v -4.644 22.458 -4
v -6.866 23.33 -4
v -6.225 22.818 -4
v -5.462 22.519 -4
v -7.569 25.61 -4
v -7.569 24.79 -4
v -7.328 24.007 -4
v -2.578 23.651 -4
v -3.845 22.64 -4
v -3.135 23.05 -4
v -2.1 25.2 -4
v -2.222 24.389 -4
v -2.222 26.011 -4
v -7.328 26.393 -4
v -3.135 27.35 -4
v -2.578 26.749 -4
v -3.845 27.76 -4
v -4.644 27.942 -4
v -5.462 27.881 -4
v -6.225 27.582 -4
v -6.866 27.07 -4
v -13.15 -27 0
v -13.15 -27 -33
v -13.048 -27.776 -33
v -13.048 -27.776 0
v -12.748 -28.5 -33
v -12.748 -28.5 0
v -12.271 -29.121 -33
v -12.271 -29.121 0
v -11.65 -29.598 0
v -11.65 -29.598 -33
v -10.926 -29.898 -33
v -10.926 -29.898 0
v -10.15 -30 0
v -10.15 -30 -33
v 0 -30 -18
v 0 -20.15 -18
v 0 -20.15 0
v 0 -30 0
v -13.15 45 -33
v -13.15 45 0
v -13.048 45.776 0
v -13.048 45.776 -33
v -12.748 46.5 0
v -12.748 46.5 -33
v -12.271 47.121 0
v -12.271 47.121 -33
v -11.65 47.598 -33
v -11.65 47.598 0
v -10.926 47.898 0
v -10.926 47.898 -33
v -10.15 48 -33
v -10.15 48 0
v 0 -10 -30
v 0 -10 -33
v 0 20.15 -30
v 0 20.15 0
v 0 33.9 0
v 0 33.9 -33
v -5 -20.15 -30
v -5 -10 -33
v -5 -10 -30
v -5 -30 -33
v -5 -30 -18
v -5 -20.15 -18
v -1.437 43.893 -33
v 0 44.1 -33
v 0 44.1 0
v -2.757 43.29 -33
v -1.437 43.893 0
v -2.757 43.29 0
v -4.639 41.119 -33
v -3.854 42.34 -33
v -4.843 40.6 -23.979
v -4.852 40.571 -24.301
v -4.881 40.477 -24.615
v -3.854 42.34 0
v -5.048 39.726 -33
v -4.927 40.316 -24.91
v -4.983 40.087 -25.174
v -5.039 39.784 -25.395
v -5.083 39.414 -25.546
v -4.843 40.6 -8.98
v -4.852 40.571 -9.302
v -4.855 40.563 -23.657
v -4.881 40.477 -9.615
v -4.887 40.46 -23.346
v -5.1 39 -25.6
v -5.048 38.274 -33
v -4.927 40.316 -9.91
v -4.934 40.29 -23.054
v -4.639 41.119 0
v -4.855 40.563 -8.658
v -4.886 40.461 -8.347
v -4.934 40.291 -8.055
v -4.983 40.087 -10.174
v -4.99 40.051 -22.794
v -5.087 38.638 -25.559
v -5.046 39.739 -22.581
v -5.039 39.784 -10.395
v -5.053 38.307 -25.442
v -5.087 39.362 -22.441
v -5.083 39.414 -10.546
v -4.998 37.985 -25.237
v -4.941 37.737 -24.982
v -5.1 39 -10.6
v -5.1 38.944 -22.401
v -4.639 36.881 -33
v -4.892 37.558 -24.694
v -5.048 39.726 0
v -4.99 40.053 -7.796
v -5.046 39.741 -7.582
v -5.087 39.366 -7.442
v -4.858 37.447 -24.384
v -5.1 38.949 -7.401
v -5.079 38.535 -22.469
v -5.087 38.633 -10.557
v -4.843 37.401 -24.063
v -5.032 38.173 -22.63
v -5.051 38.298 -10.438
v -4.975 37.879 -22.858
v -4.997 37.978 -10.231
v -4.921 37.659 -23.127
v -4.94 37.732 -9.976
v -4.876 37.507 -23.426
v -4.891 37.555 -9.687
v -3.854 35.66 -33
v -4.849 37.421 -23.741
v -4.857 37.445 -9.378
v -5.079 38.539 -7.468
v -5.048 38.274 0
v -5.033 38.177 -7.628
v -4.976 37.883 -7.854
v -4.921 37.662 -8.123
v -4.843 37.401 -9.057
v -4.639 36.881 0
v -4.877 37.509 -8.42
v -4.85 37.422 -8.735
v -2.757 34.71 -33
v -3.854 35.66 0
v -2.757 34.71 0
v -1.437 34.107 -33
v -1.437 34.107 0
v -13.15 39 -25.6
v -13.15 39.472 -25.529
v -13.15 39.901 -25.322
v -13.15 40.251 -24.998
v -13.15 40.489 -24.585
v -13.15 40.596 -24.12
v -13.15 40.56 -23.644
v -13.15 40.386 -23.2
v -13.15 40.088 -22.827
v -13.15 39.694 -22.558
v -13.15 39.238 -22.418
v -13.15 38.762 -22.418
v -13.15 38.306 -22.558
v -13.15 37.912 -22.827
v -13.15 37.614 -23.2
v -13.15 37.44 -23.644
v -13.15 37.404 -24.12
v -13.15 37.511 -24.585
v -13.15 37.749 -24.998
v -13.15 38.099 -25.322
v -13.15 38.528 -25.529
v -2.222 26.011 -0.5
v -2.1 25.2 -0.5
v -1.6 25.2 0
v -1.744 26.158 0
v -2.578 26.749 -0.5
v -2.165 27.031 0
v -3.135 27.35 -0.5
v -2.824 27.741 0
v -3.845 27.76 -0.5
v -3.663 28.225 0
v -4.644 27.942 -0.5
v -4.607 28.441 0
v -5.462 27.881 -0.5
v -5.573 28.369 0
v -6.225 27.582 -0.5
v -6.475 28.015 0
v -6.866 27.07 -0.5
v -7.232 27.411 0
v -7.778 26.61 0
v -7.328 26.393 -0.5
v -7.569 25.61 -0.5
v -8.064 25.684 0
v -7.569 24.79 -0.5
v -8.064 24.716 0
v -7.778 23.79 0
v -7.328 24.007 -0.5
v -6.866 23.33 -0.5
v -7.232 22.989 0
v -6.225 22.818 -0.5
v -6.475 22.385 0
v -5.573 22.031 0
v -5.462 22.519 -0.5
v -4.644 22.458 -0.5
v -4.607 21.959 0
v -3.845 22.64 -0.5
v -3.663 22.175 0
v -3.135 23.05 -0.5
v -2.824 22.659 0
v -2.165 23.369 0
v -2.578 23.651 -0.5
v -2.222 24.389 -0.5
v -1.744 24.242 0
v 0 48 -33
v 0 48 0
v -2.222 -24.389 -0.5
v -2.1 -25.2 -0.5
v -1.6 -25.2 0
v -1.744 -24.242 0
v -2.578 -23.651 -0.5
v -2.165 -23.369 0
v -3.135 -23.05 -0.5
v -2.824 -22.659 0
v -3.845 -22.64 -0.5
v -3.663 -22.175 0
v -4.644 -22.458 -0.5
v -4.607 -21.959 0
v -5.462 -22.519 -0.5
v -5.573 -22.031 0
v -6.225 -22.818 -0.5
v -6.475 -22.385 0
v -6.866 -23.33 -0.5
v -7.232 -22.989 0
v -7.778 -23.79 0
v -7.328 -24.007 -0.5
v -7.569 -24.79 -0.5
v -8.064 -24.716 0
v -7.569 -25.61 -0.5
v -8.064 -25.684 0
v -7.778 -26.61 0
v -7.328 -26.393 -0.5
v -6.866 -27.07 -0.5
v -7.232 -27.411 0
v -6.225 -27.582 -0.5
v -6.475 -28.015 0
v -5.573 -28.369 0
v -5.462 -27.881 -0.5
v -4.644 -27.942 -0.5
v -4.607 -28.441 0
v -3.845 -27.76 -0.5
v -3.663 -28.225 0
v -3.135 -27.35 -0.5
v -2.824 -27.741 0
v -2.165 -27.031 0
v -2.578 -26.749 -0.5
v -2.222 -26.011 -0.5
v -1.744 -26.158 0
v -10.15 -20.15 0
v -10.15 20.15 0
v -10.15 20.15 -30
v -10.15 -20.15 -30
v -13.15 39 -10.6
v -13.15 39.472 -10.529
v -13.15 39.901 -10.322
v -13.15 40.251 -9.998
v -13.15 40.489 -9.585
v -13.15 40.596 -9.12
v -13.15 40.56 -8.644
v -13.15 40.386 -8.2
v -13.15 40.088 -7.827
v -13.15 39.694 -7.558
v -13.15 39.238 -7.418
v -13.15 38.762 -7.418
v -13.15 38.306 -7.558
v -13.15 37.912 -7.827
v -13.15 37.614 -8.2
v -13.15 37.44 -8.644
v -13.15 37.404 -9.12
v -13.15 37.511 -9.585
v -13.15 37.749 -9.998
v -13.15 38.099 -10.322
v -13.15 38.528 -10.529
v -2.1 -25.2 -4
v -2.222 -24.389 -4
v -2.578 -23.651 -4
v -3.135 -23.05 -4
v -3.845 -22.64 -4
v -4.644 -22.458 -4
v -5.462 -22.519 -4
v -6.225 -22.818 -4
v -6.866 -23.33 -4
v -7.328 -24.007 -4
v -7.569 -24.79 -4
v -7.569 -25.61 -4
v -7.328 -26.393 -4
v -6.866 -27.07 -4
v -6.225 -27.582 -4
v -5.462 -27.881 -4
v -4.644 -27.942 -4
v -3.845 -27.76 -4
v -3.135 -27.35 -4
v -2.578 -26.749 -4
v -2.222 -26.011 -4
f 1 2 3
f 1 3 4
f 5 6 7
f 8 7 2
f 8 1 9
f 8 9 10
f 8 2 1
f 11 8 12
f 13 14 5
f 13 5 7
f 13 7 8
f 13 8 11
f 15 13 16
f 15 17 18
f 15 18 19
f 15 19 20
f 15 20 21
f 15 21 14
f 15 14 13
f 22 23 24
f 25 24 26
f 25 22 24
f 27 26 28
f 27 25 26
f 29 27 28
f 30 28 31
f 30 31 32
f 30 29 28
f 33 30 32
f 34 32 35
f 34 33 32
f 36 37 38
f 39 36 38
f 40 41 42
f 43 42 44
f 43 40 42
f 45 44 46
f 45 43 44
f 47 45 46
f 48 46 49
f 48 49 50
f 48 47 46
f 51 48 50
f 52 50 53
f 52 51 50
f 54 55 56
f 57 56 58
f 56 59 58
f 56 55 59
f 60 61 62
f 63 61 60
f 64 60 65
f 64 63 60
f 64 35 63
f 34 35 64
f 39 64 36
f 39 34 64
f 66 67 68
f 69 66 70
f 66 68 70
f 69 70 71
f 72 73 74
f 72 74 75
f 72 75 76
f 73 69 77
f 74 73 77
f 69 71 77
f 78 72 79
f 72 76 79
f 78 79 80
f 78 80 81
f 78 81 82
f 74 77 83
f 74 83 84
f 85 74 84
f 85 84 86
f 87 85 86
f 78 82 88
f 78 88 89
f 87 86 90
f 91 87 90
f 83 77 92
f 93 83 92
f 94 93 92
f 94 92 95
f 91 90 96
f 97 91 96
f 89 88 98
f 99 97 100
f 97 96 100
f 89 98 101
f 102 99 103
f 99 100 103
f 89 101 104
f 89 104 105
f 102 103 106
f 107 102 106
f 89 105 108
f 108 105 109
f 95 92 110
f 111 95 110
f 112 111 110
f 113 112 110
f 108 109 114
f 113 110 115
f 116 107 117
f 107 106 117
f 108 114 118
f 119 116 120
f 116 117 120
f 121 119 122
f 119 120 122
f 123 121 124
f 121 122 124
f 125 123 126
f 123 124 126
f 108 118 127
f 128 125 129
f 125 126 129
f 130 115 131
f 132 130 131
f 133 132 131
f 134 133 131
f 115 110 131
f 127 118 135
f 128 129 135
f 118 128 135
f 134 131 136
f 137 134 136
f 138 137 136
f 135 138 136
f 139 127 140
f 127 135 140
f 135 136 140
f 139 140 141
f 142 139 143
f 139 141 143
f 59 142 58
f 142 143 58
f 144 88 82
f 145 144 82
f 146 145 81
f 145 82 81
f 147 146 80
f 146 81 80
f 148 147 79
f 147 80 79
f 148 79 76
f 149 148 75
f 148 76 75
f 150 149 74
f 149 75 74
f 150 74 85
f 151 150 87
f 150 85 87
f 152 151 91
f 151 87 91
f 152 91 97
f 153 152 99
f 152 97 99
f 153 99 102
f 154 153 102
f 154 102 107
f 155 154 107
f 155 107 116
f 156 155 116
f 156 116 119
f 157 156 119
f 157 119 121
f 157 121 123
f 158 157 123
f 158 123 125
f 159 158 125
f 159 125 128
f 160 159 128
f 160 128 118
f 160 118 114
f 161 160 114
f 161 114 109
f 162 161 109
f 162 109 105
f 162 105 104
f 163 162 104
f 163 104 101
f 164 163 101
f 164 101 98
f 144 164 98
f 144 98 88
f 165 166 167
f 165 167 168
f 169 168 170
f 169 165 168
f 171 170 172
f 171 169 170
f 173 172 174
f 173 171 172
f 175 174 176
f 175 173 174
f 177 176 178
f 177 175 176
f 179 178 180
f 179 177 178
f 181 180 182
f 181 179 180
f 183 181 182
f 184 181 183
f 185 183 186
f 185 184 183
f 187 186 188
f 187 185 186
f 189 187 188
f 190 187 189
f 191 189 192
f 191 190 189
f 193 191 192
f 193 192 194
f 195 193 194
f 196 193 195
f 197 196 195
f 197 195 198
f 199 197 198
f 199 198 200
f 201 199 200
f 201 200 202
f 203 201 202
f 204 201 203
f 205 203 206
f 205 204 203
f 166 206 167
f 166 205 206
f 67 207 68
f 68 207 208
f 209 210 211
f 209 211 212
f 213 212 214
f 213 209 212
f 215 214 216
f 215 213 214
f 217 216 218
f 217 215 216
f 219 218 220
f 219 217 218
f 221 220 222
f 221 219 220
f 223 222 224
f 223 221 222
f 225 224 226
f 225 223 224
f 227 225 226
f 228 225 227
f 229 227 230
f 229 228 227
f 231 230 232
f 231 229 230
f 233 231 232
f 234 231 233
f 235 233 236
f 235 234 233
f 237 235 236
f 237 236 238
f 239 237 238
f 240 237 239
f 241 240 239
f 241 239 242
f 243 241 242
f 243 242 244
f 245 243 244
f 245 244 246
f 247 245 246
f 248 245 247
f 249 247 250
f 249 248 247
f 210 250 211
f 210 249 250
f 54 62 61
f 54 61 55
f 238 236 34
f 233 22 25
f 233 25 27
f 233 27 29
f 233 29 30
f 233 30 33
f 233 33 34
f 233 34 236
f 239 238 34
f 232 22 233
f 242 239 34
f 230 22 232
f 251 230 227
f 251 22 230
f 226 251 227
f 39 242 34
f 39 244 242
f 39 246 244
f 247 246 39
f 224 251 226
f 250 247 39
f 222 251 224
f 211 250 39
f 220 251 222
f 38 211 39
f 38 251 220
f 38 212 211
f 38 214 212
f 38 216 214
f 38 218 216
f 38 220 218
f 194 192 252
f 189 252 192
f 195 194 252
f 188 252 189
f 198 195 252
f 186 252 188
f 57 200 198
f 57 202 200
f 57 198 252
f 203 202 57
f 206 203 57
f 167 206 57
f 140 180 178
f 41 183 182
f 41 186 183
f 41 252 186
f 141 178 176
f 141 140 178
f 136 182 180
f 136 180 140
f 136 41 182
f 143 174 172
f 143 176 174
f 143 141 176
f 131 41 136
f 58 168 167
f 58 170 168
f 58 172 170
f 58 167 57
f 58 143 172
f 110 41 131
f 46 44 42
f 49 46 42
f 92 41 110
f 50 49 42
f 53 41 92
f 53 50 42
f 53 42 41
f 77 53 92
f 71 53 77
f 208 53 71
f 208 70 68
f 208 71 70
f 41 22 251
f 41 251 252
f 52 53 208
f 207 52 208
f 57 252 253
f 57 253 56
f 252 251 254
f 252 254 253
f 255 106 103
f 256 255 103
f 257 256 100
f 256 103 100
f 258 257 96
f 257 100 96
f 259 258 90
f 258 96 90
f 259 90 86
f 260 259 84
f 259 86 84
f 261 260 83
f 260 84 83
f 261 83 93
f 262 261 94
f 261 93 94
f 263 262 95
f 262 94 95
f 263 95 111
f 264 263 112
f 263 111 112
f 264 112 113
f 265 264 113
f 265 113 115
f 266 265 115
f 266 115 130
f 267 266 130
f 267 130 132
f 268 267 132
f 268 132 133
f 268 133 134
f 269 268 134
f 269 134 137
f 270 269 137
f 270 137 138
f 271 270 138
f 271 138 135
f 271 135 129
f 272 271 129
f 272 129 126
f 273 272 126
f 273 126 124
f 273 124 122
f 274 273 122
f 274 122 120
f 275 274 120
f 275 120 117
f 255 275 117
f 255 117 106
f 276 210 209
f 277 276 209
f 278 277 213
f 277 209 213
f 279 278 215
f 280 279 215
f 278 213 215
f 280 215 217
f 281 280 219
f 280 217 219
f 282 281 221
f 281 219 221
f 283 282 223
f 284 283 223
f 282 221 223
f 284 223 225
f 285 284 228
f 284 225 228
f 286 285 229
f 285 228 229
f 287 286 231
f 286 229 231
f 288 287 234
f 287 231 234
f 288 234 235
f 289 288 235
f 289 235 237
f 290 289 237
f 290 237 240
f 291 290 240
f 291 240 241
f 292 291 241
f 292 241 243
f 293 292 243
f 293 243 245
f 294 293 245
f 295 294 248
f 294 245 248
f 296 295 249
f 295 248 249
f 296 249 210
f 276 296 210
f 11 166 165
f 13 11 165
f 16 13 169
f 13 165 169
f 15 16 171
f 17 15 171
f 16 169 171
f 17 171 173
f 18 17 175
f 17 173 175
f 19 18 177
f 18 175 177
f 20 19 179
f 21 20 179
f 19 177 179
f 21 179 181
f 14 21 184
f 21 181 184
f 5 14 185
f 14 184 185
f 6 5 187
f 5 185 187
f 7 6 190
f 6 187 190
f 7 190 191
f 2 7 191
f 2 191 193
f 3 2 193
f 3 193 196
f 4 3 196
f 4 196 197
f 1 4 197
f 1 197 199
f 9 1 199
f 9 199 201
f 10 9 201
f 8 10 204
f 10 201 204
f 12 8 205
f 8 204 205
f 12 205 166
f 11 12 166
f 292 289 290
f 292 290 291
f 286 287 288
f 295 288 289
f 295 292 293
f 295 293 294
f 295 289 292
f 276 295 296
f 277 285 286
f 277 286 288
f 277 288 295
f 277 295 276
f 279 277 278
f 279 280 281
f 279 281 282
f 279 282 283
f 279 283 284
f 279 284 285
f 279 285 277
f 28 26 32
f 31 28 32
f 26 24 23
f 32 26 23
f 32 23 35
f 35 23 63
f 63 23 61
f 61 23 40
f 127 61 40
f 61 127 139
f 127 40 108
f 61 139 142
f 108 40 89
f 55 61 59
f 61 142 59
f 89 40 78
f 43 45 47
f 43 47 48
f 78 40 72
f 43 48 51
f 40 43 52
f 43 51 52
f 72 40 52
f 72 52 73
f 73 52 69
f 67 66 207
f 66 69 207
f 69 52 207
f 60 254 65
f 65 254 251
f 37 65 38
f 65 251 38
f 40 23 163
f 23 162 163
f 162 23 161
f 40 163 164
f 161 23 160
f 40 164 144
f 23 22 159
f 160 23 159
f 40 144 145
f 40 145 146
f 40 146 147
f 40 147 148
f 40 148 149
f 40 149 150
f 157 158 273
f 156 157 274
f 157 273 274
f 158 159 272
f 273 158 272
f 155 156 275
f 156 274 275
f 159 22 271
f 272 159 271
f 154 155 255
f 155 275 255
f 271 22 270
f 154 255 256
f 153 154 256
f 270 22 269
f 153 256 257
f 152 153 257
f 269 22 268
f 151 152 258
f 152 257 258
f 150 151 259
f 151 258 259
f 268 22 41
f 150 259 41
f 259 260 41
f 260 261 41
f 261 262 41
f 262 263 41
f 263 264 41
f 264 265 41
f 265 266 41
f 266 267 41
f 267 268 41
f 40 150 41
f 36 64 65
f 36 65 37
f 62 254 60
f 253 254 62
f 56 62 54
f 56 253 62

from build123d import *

# Parameters (mm, degrees)
SKETCH1_W           = 26.3
SKETCH1_H           = 60
SKETCH1_W_2         = 20.3
SKETCH1_H_2         = 40.3
BOSS_EXTRUDE1_DEPTH = 30
BOSS_EXTRUDE2_START = -30
SKETCH1_2_W         = 26.3
SKETCH1_2_H         = 60
BOSS_EXTRUDE2_DEPTH = 3
SKETCH2_W           = 26.3
SKETCH2_H           = 18
SKETCH2_R           = 5.1
BOSS_EXTRUDE3_DEPTH = 33
SKETCH3_W           = 10
SKETCH3_H           = 15
CUT_EXTRUDE1_DEPTH  = 20
CUT_EXTRUDE2_DEPTH  = 64.911579545
FILLET1_R           = 3
SKETCH5_R           = 2.75
CUT_EXTRUDE3_DEPTH  = 4
CHAMFER1_SIZE       = 0.5


with BuildPart() as part:
    # Sketch1 → Boss-Extrude1 (new body)
    with BuildSketch(Plane.XY):
        Rectangle(SKETCH1_W, SKETCH1_H)
        Rectangle(SKETCH1_W_2, SKETCH1_H_2, mode=Mode.SUBTRACT)
    extrude(amount=-BOSS_EXTRUDE1_DEPTH)

    # Sketch1<2> → Boss-Extrude2 (add)
    with BuildSketch(Plane.XY.offset(BOSS_EXTRUDE2_START)):
        Rectangle(SKETCH1_2_W, SKETCH1_2_H)
    extrude(amount=-BOSS_EXTRUDE2_DEPTH)

    # Sketch2 → Boss-Extrude3 (add)
    with BuildSketch(Plane.XY):
        with Locations((0, 39)):
            Rectangle(SKETCH2_W, SKETCH2_H)
        with Locations((0, 39)):
            Circle(SKETCH2_R, mode=Mode.SUBTRACT)
    extrude(amount=-BOSS_EXTRUDE3_DEPTH)

    # Sketch3 → Cut-Extrude1 (cut)
    with BuildSketch(Plane.XZ.offset(30)):
        with Locations((0, -25.5)):
            Rectangle(SKETCH3_W, SKETCH3_H)
    extrude(amount=-CUT_EXTRUDE1_DEPTH, mode=Mode.SUBTRACT)

    # Sketch4 → Cut-Extrude2 (cut, through all)
    with BuildSketch(Plane(origin=(13.15, 0, 0), x_dir=(0, 0, -1), z_dir=(1, 0, 0))):
        with BuildLine():
            ThreePointArc((7.4, 39), (9, 37.4), (10.6, 39))
            Line((10.6, 39), (7.4, 39))
        make_face()
        with BuildLine():
            Line((7.4, 39), (10.6, 39))
            ThreePointArc((10.6, 39), (9, 40.6), (7.4, 39))
        make_face()
        with BuildLine():
            ThreePointArc((22.4, 39), (24, 37.4), (25.6, 39))
            Line((25.6, 39), (22.4, 39))
        make_face()
        with BuildLine():
            Line((22.4, 39), (25.6, 39))
            ThreePointArc((25.6, 39), (24, 40.6), (22.4, 39))
        make_face()
    extrude(amount=-CUT_EXTRUDE2_DEPTH, mode=Mode.SUBTRACT)

    # Fillet1
    fillet1_edges = [part.edges().sort_by_distance(p)[0] for p in [
        (-13.15, 48, -16.5),
        (13.15, 48, -16.5),
        (13.15, -30, -16.5),
        (-13.15, -30, -16.5),
    ]]
    fillet(fillet1_edges, radius=FILLET1_R)

    # Sketch5 → Cut-Extrude3 (cut)
    with BuildSketch(Plane.XY):
        with Locations((5.15, 25.2)):
            Circle(SKETCH5_R)
        with Locations((-4.85, 25.2)):
            Circle(SKETCH5_R)
        with Locations((5.15, -25.2)):
            Circle(SKETCH5_R)
        with Locations((-4.85, -25.2)):
            Circle(SKETCH5_R)
    extrude(amount=-CUT_EXTRUDE3_DEPTH, mode=Mode.SUBTRACT)

    # Chamfer1
    chamfer1_edges = [part.edges().sort_by_distance(p)[0] for p in [
        (-7.6, 25.2, 0),
        (2.4, -25.2, 0),
        (-7.6, -25.2, 0),
        (2.4, 25.2, 0),
    ]]
    chamfer(chamfer1_edges, length=CHAMFER1_SIZE)

    # SurfaceCut2
    split(bisect_by=Plane.ZY, keep=Keep.TOP)


solid = part.part
